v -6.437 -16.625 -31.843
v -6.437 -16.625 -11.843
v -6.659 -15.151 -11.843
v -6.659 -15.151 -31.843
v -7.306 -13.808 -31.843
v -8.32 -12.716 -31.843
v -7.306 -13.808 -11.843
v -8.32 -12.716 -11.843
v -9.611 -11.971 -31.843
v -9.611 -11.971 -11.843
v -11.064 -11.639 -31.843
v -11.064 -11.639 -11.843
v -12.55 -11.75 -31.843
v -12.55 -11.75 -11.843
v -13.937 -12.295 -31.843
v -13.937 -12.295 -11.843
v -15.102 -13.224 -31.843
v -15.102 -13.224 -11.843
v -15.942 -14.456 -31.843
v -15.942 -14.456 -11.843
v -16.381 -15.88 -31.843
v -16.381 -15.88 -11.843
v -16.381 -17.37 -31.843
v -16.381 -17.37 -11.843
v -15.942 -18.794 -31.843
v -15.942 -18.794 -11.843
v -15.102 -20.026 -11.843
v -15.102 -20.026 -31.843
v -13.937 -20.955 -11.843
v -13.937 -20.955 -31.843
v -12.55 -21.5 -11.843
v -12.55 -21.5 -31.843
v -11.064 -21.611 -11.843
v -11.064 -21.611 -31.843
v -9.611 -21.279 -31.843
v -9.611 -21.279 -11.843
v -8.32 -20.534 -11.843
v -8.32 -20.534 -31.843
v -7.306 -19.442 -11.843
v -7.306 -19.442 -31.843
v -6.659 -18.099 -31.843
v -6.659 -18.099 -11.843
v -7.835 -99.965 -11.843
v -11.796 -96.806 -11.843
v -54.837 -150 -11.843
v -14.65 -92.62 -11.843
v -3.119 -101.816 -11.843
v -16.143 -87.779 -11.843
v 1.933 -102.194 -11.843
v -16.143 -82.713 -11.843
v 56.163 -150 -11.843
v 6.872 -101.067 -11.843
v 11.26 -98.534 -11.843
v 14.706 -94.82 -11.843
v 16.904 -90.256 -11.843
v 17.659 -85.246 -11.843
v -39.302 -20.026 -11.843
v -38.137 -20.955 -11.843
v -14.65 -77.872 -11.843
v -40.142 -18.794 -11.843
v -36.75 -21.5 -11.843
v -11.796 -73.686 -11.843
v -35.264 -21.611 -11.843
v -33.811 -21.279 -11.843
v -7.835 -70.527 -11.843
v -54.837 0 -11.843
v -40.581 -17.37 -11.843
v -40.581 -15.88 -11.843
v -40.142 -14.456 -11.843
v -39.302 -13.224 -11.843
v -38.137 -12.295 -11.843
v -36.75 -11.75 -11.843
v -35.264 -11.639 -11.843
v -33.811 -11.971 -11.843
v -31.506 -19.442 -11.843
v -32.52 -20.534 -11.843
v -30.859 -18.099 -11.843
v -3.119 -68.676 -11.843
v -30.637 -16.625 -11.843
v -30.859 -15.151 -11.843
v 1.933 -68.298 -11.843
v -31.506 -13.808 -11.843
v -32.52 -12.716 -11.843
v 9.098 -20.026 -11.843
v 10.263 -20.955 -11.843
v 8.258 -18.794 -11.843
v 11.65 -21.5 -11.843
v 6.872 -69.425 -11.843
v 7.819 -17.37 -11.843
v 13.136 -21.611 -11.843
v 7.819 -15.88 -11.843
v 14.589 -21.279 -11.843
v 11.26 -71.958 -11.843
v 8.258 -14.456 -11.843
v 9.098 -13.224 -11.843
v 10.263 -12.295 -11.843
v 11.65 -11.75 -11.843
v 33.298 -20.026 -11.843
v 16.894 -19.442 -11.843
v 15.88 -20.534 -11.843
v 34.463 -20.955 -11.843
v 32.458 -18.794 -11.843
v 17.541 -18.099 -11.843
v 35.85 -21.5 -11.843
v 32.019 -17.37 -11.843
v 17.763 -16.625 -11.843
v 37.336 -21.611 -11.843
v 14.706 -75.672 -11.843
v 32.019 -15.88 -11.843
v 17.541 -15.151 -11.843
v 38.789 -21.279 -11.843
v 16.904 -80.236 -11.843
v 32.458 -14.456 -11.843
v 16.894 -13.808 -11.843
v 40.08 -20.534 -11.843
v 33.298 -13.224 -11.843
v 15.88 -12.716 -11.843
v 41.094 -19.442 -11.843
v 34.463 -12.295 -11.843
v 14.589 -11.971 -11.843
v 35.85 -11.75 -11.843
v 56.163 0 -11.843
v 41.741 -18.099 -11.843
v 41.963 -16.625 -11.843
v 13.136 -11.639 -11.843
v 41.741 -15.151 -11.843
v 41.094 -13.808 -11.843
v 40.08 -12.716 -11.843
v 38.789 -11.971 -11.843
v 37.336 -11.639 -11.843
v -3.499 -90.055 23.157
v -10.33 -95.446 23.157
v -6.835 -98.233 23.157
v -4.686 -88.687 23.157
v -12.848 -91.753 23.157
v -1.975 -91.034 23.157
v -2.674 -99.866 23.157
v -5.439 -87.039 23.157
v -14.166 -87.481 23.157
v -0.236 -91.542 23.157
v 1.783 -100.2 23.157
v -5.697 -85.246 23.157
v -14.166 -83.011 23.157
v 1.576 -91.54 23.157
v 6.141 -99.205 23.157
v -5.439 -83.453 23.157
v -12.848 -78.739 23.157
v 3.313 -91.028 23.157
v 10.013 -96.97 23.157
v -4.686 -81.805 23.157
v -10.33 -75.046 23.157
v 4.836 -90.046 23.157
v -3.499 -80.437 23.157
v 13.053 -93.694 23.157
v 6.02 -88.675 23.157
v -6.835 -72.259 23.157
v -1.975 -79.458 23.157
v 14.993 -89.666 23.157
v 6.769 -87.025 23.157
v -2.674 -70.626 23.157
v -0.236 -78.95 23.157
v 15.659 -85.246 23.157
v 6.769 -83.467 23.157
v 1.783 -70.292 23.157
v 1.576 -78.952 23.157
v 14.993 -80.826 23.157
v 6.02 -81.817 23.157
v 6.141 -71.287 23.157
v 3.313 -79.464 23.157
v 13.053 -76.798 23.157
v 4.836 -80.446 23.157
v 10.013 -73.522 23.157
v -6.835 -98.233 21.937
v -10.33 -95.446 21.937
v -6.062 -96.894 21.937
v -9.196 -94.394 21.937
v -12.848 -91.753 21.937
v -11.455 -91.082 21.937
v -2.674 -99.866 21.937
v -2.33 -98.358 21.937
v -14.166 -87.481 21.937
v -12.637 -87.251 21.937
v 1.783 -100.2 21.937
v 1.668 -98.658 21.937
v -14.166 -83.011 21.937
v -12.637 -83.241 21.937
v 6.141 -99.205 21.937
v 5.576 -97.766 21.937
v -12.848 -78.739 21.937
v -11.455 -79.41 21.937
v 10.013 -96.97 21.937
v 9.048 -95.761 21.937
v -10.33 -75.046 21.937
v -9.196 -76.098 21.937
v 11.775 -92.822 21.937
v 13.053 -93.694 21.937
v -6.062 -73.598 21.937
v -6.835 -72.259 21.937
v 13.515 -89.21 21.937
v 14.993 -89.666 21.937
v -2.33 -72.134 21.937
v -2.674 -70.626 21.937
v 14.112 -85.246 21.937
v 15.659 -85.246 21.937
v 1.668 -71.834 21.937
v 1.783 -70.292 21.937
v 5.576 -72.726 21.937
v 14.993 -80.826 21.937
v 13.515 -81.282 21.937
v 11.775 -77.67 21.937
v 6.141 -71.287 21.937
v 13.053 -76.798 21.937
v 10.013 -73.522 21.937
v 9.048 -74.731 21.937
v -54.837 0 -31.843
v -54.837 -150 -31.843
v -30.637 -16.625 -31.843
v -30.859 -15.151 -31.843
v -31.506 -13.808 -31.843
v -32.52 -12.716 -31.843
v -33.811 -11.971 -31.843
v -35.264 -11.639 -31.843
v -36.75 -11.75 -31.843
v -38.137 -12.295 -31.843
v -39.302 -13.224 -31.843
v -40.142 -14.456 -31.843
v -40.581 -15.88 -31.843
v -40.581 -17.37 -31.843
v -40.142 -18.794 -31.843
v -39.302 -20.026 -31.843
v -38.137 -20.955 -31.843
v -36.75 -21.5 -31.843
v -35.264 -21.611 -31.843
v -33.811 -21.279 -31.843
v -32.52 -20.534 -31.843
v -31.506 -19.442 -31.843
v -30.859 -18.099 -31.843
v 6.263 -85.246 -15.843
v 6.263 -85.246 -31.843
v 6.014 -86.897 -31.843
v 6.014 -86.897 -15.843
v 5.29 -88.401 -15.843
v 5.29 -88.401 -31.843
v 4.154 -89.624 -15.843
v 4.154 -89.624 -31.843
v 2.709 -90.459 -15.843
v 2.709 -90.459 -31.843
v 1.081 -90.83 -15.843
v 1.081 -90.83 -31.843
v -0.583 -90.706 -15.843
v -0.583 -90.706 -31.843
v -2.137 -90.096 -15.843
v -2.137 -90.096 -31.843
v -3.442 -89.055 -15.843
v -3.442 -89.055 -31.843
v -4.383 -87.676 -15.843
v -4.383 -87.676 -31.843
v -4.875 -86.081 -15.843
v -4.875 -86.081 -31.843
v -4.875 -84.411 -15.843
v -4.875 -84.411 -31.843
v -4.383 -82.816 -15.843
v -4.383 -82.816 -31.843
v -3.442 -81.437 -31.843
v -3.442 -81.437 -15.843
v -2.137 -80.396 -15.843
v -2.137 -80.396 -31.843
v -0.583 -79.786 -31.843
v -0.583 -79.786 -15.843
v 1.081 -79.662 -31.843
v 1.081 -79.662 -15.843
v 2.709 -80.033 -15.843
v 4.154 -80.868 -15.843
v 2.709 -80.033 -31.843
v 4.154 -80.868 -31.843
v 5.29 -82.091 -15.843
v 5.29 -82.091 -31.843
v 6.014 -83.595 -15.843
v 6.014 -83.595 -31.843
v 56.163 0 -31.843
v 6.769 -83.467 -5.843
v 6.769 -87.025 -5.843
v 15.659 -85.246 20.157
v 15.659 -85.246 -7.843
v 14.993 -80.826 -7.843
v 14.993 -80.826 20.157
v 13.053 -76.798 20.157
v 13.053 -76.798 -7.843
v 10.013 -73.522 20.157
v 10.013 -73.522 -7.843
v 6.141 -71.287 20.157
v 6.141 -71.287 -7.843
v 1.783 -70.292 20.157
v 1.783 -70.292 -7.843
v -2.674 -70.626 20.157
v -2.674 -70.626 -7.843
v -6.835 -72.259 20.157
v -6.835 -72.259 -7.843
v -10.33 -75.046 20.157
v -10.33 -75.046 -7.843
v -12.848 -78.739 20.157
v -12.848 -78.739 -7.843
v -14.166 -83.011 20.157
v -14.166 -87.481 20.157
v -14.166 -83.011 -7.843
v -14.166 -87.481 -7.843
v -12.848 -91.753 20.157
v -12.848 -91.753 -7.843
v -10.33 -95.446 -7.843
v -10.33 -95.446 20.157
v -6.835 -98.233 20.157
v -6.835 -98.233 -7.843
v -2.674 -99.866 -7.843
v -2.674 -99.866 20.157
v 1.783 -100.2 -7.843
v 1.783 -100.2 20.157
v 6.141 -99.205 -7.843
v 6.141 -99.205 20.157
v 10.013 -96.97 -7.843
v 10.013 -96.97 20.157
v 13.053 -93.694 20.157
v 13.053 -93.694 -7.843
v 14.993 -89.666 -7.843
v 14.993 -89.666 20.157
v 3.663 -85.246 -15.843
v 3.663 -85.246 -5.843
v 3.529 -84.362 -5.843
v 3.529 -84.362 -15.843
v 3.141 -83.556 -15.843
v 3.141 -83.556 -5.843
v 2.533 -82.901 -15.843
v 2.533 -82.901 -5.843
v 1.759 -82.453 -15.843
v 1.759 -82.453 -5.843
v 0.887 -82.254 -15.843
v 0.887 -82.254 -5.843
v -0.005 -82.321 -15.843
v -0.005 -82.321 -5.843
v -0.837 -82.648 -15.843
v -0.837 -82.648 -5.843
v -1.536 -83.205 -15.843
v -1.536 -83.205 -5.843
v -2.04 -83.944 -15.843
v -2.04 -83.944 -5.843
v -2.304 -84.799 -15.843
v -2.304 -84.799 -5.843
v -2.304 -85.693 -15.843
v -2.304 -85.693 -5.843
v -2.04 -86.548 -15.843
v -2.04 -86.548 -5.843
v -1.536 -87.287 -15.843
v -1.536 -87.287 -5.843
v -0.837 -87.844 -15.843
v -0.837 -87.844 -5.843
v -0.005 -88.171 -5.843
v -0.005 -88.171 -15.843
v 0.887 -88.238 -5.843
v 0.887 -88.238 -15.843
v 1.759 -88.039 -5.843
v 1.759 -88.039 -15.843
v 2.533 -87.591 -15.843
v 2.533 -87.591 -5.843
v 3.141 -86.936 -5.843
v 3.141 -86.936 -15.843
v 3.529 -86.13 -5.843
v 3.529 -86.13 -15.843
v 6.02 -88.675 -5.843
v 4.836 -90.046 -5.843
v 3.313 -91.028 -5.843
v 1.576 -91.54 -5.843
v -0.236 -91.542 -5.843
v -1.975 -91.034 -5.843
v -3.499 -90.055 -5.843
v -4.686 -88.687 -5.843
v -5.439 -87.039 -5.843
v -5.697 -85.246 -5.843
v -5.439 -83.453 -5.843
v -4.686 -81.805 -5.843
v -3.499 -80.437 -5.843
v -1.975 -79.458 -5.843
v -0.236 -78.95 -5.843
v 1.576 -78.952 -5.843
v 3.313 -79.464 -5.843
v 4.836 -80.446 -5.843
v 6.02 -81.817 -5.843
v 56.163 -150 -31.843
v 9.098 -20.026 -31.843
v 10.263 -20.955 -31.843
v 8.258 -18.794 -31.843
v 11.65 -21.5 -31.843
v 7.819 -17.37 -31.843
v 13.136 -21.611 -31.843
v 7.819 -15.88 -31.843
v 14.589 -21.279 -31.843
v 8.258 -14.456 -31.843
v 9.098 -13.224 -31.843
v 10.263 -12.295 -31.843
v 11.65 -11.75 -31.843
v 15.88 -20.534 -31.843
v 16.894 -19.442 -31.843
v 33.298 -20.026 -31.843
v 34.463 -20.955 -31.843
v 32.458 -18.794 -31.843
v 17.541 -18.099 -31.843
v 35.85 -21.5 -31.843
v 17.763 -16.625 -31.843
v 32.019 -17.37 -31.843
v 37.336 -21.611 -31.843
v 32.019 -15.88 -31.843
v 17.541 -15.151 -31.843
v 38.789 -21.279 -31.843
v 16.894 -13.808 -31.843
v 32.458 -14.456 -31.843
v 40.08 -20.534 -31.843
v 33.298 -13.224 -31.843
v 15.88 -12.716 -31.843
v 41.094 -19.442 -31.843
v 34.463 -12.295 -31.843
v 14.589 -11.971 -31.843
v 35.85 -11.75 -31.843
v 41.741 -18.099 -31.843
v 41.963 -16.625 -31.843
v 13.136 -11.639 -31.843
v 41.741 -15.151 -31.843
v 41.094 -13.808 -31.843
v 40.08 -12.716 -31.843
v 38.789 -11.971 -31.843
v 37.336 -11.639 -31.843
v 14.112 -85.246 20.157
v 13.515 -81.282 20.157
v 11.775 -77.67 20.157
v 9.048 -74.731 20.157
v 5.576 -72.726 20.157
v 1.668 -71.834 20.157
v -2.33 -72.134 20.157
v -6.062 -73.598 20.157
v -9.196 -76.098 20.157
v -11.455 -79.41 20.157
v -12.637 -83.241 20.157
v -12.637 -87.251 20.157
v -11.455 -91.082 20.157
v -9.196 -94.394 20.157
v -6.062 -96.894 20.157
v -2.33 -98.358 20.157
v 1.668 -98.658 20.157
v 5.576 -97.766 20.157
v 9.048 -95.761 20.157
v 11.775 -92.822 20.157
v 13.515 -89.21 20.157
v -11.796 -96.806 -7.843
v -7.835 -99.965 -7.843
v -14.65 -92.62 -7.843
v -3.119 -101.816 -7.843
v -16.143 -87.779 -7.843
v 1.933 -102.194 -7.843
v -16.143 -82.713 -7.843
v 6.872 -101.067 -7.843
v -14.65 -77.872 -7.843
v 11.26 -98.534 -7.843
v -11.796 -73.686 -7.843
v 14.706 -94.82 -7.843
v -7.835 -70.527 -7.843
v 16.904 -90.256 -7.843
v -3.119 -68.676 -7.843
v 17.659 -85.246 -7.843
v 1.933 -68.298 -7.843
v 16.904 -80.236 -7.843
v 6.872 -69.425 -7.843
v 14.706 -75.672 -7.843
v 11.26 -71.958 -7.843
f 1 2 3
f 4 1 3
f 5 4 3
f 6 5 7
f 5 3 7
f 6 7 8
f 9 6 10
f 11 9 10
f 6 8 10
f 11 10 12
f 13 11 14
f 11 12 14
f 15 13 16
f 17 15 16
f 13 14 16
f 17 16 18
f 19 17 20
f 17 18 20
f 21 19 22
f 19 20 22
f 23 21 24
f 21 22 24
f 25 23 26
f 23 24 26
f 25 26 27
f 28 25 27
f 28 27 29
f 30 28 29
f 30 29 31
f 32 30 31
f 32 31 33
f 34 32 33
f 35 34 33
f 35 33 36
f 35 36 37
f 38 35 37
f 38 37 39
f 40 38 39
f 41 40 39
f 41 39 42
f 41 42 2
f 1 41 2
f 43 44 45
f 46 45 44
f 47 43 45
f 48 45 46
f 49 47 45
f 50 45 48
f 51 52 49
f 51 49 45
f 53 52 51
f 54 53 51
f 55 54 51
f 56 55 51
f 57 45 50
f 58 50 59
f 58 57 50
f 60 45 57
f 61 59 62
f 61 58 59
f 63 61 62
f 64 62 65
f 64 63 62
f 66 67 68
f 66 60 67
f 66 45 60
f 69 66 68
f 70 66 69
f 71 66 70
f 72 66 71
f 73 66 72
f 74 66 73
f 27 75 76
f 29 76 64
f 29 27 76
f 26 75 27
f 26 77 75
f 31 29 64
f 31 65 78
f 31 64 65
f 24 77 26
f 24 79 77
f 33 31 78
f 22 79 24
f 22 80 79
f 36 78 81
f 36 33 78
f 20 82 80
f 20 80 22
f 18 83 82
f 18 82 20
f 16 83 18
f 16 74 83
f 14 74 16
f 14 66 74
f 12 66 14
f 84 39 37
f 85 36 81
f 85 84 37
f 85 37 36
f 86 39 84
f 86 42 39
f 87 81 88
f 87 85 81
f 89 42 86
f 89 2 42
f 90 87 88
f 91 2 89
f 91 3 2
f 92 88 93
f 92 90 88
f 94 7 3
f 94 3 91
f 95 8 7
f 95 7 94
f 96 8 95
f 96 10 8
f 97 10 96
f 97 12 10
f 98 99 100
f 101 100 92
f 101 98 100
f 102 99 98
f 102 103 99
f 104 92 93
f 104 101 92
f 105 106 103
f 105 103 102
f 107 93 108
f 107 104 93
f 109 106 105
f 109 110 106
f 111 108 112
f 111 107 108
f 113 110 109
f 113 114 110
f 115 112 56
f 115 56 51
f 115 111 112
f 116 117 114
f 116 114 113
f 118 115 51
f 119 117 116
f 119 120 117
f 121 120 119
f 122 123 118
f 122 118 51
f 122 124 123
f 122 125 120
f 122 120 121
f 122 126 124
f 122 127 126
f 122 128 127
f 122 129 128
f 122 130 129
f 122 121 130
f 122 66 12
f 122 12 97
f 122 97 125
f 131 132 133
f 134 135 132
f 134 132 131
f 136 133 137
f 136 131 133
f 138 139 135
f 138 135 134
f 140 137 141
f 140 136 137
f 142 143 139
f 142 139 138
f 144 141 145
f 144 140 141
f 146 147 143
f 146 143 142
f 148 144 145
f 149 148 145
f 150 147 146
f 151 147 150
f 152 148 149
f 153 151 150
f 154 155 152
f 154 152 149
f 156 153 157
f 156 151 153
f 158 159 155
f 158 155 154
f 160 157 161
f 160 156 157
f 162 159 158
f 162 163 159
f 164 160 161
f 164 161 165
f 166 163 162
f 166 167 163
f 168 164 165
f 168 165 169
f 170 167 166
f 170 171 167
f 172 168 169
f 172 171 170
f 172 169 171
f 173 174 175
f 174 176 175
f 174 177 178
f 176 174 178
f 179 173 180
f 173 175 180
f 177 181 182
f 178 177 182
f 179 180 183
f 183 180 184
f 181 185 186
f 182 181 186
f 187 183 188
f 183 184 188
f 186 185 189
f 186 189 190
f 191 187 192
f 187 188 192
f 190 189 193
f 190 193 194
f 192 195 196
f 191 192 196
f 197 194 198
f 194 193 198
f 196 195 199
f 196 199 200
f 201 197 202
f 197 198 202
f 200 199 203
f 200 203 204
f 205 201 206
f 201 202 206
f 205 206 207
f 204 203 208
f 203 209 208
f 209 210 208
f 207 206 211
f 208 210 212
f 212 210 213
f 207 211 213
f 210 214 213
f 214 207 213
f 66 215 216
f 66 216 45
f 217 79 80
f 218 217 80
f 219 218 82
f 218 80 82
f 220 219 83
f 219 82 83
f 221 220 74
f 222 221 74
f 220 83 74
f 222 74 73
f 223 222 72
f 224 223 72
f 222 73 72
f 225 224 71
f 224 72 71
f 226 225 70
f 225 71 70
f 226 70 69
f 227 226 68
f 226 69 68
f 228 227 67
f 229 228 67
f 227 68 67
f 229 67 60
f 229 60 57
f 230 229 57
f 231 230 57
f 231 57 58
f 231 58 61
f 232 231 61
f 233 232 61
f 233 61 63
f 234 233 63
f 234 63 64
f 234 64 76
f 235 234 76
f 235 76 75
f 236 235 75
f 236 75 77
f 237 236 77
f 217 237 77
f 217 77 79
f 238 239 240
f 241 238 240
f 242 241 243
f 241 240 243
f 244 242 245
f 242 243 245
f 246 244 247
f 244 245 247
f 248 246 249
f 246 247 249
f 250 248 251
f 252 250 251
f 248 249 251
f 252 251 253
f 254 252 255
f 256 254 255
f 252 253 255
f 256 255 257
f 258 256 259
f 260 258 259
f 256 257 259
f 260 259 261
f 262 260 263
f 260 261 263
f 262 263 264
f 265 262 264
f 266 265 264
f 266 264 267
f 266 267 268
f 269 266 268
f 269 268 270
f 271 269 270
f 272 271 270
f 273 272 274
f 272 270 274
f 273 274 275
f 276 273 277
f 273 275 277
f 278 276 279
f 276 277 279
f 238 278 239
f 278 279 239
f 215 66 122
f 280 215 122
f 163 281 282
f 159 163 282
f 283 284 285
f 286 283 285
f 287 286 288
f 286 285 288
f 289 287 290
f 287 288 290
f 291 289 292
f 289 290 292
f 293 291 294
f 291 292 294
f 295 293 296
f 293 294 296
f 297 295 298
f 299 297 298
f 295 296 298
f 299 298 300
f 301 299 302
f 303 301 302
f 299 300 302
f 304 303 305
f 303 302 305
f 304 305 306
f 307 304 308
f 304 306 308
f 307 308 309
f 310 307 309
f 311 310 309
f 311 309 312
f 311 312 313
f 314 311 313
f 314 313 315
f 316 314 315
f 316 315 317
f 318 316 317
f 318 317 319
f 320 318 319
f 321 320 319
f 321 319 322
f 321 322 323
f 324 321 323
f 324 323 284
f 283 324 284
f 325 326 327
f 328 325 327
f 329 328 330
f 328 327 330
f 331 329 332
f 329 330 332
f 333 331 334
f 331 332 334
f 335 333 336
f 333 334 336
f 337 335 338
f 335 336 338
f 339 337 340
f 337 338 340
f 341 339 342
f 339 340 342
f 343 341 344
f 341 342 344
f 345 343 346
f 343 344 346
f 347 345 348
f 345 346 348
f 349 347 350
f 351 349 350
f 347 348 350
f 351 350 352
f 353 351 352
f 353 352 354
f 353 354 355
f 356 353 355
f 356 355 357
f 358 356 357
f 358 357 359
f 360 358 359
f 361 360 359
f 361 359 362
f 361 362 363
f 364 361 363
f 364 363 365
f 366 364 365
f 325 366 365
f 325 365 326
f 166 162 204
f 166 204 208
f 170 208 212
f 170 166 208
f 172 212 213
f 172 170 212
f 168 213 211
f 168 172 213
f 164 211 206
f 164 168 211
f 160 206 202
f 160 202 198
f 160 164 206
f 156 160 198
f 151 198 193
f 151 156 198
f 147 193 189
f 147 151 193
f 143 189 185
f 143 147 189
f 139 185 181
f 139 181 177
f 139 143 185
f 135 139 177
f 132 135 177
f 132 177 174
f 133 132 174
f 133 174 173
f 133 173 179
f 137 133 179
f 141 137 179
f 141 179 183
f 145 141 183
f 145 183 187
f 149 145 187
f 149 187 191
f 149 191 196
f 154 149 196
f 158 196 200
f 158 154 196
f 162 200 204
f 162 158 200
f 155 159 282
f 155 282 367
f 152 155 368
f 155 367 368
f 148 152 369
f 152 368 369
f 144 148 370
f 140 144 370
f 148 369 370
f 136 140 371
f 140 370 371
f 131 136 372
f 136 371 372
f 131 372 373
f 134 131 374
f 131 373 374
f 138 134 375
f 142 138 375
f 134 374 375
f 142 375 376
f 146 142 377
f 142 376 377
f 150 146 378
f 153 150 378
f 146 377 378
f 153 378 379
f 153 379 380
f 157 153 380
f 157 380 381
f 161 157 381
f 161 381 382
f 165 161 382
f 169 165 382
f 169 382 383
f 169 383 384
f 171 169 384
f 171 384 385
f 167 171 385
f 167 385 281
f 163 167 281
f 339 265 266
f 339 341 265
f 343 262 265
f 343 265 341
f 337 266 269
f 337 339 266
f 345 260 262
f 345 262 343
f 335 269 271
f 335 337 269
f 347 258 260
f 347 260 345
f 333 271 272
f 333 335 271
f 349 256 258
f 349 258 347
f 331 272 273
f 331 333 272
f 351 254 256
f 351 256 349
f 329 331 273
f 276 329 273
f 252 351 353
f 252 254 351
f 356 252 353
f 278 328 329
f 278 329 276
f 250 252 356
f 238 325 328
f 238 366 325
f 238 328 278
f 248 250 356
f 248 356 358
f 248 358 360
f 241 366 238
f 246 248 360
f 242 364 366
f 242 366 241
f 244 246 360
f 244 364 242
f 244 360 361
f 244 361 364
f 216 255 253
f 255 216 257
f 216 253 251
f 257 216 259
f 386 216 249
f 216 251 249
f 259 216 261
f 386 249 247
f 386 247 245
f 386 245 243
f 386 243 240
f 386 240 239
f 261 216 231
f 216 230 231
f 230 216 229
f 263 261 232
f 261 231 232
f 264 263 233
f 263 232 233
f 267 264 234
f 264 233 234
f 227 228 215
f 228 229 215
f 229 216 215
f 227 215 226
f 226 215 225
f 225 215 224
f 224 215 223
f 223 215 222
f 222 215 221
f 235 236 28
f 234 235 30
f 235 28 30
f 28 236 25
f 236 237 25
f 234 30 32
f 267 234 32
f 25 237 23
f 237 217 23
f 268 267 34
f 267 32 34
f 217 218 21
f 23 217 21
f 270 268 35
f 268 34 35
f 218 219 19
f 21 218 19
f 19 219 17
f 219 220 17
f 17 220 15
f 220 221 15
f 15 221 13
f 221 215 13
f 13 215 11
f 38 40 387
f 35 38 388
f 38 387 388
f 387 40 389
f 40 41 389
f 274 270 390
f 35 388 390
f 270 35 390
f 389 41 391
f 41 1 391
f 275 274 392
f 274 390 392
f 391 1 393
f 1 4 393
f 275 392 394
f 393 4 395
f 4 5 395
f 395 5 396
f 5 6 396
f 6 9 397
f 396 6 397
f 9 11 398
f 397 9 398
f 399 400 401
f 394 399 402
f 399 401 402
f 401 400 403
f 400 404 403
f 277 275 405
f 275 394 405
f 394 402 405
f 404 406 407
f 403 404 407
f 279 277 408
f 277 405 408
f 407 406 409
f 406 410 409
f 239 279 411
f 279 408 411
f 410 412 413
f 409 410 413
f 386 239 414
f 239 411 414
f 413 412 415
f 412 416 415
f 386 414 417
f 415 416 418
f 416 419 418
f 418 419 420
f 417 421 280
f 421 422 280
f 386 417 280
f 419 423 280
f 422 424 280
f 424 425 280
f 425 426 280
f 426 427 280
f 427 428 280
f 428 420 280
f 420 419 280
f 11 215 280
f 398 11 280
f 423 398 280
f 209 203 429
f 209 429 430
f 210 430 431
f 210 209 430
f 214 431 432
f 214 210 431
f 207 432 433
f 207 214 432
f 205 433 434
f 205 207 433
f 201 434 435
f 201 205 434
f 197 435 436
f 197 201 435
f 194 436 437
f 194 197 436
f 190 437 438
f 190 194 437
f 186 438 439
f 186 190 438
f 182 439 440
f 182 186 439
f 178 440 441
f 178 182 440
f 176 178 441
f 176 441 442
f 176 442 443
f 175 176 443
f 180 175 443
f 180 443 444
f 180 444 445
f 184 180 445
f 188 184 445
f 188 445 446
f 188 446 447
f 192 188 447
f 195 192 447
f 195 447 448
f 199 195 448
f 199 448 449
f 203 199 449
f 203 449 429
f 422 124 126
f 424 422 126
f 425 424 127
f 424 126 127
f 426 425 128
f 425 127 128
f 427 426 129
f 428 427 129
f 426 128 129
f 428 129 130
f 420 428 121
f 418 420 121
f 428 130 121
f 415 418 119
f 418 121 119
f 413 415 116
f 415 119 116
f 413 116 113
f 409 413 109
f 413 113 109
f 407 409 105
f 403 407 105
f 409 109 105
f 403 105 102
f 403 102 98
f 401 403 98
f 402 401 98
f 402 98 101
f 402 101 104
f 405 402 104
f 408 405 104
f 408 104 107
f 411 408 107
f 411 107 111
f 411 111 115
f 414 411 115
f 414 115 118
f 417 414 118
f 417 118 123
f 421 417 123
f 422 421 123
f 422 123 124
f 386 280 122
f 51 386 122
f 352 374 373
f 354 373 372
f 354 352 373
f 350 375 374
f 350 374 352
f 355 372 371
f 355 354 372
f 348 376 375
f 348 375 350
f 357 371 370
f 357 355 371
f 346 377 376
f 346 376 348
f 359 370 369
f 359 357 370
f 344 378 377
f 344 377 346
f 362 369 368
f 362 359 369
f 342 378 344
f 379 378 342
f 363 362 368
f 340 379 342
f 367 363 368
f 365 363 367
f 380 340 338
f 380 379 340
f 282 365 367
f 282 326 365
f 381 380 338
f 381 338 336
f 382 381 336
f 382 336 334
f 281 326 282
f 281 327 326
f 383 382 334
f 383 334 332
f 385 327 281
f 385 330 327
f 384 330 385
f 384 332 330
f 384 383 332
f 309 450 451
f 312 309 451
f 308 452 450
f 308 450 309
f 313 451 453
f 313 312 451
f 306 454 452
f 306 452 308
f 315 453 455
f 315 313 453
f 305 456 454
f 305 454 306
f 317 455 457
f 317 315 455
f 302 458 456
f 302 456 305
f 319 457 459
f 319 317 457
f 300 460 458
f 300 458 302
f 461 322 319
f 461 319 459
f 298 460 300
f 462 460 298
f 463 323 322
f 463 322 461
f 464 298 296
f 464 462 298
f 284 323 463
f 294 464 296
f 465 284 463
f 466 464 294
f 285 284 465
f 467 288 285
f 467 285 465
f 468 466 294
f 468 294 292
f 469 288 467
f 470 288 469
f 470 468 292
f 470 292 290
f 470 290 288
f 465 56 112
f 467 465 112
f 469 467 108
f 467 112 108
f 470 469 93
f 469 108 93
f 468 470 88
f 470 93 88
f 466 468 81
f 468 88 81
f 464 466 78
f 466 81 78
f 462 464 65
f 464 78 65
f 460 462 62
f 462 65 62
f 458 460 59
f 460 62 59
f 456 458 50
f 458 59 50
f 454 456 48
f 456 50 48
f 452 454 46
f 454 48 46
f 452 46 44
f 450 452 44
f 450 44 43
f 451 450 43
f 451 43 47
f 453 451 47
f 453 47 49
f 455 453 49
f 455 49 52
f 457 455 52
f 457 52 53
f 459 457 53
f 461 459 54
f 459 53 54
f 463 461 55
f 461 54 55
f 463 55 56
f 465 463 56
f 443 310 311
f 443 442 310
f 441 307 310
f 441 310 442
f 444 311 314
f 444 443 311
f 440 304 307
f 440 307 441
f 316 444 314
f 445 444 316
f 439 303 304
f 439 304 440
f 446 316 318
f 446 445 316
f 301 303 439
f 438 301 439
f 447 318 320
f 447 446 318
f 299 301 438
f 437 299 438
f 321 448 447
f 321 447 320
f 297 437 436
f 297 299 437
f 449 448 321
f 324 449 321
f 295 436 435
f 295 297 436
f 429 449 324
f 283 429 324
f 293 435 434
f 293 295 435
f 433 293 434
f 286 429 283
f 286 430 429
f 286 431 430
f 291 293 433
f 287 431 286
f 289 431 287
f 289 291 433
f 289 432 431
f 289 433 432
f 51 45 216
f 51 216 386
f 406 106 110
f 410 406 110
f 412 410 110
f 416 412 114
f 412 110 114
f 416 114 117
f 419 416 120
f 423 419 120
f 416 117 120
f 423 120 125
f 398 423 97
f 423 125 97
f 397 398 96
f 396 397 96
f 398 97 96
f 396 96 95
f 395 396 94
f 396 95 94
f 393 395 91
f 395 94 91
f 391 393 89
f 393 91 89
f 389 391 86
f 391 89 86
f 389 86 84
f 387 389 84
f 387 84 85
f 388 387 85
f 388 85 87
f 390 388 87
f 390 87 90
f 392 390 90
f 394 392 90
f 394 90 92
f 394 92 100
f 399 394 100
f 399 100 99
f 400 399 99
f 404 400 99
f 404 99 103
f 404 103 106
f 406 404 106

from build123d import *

# Parameters (mm, degrees)
F0_W      = 111
F0_H      = 20
F1_DEPTH  = 150
F2_R      = 14.996
F3_DEPTH  = 35
F4_R      = 14.996
F4_R_2    = 13.4495
F5_DEPTH  = 3
F6_R      = 14.996
F6_R_2    = 13.4495
F7_DEPTH  = 1.22
F8_R      = 16.996
F9_DEPTH  = 4
F10_R     = 8.540661
F11_DEPTH = 2
F12_R     = 5
F13_DEPTH = 20.001
F14_R     = 3
F15_DEPTH = 26.001
F16_R     = 5.6
F17_DEPTH = 16


with BuildPart() as f1:
    # F0 (on Front) → F1 (new body)
    with BuildSketch(Plane.XZ):
        with Locations((0.662768, -21.843081)):
            Rectangle(F0_W, F0_H)
    extrude(amount=F1_DEPTH)

    # F2 (on face) → F3 (join)
    with BuildSketch(Plane.XY.offset(-11.843081)):
        with Locations((0.662768, -85.246)):
            Circle(F2_R)
        with BuildLine():
            ThreePointArc((6.768928, -87.025451), (-5.697392, -85.246), (6.768928, -83.466549))
            Line((6.768928, -83.466549), (6.768928, -87.025451))
        make_face(mode=Mode.SUBTRACT)
    extrude(amount=F3_DEPTH)

    # F4 (on face) → F5 (cut)
    with BuildSketch(Plane.XY.offset(23.156919)):
        with Locations((0.662768, -85.246)):
            Circle(F4_R)
        with Locations((0.662768, -85.246)):
            Circle(F4_R_2, mode=Mode.SUBTRACT)
    extrude(amount=-F5_DEPTH, mode=Mode.SUBTRACT)

    # F6 (on face) → F7 (join)
    with BuildSketch(Plane.XY.offset(23.156919)):
        with Locations((0.662768, -85.246)):
            Circle(F6_R)
        with Locations((0.662768, -85.246)):
            Circle(F6_R_2, mode=Mode.SUBTRACT)
    extrude(amount=-F7_DEPTH)

    # F8 (on face) → F9 (join)
    with BuildSketch(Plane.XY.offset(-11.843081)):
        with Locations((0.662768, -85.246)):
            Circle(F8_R)
    extrude(amount=F9_DEPTH)

    # F10 (on face) → F11 (join)
    with BuildSketch(Plane.XY.offset(-7.843081)):
        with Locations((0.662768, -85.246)):
            Circle(F10_R)
    extrude(amount=F11_DEPTH)

    # F12 (on face) → F13 (cut, through all)
    with BuildSketch(Plane.XY.offset(-11.843081)):
        with Locations((36.962768, -16.625)):
            Circle(F12_R)
        with Locations((12.762768, -16.625)):
            Circle(F12_R)
        with Locations((-11.437232, -16.625)):
            Circle(F12_R)
        with Locations((-35.637232, -16.625)):
            Circle(F12_R)
    extrude(amount=-F13_DEPTH, mode=Mode.SUBTRACT)

    # F14 (on face) → F15 (cut, through all)
    with BuildSketch(Plane.XY.offset(-5.843081)):
        with Locations((0.662768, -85.246)):
            Circle(F14_R)
    extrude(amount=-F15_DEPTH, mode=Mode.SUBTRACT)

    # F16 (on face) → F17 (cut)
    with BuildSketch(Plane(origin=(0, 0, -31.843081), x_dir=(1, 0, 0), z_dir=(0, 0, -1))):
        with Locations((0.662768, 85.246)):
            Circle(F16_R)
    extrude(amount=-F17_DEPTH, mode=Mode.SUBTRACT)


solid = f1.part
